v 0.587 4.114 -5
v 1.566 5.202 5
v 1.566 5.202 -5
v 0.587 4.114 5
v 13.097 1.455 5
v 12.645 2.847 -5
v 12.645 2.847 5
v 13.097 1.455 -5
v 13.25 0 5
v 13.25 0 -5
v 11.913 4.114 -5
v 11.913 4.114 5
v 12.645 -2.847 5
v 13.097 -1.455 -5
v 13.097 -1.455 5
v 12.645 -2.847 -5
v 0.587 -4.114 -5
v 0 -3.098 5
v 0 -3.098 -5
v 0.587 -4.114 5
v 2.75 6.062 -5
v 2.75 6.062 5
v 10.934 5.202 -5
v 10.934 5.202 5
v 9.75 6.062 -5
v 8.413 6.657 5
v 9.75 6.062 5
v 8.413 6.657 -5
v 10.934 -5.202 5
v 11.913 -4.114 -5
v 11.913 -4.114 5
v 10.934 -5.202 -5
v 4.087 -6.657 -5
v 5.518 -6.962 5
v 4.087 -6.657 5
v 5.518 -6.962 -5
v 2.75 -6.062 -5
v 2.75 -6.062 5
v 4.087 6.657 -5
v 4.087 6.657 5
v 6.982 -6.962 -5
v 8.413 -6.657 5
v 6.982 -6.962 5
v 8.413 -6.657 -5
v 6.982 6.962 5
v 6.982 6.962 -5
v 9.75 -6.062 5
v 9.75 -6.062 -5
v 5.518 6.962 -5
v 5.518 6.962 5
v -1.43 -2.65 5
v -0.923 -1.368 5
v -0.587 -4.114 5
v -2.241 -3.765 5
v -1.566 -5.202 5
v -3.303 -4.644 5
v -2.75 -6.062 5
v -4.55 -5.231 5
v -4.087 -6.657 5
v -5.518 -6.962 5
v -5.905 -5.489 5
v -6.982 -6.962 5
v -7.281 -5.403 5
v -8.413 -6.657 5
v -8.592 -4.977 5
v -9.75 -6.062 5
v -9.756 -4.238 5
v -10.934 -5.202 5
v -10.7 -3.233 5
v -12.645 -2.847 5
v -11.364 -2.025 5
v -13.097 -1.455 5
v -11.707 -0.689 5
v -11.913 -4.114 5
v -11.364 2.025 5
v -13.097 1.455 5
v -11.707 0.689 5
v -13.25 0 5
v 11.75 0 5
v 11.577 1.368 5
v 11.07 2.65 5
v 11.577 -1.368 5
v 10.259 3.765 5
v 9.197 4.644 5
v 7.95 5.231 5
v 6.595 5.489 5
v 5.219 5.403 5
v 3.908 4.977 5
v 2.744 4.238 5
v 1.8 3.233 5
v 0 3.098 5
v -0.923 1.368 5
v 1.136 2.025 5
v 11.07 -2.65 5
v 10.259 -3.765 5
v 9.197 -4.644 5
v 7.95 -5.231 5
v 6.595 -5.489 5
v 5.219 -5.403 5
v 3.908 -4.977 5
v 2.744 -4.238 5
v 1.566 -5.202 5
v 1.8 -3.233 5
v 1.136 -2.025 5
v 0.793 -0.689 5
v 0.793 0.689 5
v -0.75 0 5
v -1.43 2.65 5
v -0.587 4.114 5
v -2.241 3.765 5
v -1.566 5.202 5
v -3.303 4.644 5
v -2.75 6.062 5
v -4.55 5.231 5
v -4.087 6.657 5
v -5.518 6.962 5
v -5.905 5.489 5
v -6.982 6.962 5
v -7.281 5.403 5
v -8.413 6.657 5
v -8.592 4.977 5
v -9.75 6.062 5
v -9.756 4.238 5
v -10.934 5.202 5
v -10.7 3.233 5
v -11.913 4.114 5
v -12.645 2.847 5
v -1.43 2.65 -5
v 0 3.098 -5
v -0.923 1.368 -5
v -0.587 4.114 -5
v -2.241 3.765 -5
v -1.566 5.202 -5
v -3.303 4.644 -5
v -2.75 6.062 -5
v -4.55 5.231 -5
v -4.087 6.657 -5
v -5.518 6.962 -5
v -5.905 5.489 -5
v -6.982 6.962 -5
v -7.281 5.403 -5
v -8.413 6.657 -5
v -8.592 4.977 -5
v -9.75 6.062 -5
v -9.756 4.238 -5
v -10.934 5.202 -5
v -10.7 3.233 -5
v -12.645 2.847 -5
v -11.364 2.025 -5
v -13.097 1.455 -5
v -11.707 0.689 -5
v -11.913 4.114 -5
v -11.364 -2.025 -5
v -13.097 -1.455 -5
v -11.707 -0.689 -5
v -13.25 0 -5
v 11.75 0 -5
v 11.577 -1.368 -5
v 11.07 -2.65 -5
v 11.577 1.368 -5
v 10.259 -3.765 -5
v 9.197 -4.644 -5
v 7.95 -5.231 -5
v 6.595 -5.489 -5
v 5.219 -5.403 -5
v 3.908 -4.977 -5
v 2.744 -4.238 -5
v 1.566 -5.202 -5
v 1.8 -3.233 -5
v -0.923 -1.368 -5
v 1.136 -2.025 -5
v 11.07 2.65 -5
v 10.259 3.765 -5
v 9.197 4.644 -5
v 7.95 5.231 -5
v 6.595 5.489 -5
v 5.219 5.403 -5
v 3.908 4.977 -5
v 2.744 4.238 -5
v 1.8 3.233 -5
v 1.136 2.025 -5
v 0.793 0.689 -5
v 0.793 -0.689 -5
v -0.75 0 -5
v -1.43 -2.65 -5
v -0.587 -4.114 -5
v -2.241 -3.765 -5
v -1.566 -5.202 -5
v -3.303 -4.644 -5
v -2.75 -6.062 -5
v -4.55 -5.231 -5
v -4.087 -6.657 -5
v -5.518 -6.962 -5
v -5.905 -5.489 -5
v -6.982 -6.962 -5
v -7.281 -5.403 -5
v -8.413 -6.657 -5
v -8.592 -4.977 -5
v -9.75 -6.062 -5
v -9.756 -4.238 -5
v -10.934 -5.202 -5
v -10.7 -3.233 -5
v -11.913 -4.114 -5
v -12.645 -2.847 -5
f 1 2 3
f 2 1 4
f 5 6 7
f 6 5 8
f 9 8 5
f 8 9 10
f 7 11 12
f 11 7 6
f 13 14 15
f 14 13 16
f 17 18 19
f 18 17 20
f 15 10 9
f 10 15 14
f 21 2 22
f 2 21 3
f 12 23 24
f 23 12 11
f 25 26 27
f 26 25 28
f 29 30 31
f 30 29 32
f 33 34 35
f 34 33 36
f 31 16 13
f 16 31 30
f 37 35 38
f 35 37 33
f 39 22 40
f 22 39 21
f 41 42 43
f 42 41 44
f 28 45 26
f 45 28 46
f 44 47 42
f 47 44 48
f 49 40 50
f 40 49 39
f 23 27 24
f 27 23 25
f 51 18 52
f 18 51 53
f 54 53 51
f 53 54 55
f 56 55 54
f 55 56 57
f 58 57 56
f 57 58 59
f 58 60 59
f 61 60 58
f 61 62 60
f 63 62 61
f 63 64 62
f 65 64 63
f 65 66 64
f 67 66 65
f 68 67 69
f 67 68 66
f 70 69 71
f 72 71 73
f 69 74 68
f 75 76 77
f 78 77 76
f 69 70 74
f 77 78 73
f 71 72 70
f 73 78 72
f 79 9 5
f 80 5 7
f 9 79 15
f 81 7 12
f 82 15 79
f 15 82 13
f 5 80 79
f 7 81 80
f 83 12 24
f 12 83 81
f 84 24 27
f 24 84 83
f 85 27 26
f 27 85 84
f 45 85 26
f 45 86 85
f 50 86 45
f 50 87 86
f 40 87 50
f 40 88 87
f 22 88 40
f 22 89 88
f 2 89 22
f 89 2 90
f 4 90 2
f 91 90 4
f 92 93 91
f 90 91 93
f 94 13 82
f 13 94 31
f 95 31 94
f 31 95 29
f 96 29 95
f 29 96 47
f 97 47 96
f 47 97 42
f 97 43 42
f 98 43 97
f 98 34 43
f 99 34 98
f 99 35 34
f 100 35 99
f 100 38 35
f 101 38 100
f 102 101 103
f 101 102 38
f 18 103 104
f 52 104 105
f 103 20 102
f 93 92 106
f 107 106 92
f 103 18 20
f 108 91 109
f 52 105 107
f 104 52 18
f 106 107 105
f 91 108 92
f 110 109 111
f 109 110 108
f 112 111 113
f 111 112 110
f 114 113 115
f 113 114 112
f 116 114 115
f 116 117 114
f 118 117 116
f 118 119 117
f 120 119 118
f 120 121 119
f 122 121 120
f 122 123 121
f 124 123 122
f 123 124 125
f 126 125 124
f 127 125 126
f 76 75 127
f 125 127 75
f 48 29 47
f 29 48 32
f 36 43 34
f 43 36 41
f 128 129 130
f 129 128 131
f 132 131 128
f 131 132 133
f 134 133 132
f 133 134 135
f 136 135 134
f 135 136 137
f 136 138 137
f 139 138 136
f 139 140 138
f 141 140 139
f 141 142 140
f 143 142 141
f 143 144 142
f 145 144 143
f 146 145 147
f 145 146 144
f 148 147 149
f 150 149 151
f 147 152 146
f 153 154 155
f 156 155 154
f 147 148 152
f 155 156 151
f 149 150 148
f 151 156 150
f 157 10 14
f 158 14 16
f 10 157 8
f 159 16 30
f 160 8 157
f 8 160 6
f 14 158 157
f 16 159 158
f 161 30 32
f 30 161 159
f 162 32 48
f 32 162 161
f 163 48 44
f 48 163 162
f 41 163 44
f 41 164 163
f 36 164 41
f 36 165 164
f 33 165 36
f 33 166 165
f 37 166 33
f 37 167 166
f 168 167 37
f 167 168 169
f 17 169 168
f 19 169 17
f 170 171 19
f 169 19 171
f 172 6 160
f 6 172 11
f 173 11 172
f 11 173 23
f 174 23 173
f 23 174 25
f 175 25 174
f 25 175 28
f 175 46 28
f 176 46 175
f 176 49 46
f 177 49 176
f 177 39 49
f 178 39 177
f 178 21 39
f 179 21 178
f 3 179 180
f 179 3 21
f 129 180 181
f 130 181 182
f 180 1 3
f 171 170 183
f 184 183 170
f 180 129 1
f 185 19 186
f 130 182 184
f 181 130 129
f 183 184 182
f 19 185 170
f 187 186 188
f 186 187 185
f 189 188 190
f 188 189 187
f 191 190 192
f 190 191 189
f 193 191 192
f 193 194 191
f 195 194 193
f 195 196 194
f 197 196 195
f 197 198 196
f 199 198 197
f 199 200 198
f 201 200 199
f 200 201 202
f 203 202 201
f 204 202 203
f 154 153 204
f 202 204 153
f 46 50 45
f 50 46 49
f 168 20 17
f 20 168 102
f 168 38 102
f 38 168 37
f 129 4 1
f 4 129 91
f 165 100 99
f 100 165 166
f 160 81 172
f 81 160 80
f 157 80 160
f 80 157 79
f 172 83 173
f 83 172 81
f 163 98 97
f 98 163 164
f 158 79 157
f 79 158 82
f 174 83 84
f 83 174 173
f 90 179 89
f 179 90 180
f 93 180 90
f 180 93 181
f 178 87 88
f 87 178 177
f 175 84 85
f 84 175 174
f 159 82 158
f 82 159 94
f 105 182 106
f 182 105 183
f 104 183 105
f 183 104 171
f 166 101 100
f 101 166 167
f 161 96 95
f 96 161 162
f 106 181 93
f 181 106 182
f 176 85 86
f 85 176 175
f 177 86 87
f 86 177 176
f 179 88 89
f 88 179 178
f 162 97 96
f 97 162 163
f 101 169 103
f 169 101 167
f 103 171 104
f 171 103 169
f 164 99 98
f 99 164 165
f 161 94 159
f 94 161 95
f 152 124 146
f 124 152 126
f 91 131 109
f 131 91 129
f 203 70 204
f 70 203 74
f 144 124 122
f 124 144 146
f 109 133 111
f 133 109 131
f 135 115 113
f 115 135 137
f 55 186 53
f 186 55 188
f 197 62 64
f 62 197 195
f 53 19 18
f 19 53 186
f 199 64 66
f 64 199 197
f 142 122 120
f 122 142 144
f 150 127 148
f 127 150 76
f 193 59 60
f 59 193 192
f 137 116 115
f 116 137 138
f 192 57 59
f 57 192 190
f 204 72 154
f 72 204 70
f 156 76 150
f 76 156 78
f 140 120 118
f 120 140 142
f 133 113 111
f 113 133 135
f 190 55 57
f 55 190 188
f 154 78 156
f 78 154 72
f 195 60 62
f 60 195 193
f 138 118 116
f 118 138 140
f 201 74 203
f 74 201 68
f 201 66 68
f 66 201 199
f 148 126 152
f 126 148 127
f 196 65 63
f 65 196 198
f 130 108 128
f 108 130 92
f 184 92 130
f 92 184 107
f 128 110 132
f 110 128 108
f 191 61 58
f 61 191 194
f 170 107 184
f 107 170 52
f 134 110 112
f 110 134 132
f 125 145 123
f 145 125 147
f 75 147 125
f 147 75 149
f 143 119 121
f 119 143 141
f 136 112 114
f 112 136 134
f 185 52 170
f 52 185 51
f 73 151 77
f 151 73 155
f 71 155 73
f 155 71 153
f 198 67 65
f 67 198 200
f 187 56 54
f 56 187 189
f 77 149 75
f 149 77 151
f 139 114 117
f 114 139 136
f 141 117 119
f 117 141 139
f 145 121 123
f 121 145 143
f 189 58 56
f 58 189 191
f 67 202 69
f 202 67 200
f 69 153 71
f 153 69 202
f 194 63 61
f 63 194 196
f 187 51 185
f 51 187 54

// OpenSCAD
module ring() {
    difference() {
        cylinder(h=10, r=7, $fn=30, center = true);
        cylinder(h=10, r=5.5, $fn=25, center = true);
    }
}


module bottom() {
    ring();

     translate([0, 0, 3.25]) {
        height = 3.5;
        difference() {
            cylinder(h= height, r=5.5, $fn=25, center = true);
            cylinder(h= height, r=2.5, $fn=25, center = true);
        }
    }
}

module cap() {
    difference() {
        bottom();
        
        rotate([0, 0, 90]) {
            translate([-7, -3, 3]) { 
                cube([14, 6, 2]);
            }
        }
    }
}

translate([6.25, 0, 0]) {
    ring();
}

translate([-6.25, 0, 0]) {
    ring();
}
